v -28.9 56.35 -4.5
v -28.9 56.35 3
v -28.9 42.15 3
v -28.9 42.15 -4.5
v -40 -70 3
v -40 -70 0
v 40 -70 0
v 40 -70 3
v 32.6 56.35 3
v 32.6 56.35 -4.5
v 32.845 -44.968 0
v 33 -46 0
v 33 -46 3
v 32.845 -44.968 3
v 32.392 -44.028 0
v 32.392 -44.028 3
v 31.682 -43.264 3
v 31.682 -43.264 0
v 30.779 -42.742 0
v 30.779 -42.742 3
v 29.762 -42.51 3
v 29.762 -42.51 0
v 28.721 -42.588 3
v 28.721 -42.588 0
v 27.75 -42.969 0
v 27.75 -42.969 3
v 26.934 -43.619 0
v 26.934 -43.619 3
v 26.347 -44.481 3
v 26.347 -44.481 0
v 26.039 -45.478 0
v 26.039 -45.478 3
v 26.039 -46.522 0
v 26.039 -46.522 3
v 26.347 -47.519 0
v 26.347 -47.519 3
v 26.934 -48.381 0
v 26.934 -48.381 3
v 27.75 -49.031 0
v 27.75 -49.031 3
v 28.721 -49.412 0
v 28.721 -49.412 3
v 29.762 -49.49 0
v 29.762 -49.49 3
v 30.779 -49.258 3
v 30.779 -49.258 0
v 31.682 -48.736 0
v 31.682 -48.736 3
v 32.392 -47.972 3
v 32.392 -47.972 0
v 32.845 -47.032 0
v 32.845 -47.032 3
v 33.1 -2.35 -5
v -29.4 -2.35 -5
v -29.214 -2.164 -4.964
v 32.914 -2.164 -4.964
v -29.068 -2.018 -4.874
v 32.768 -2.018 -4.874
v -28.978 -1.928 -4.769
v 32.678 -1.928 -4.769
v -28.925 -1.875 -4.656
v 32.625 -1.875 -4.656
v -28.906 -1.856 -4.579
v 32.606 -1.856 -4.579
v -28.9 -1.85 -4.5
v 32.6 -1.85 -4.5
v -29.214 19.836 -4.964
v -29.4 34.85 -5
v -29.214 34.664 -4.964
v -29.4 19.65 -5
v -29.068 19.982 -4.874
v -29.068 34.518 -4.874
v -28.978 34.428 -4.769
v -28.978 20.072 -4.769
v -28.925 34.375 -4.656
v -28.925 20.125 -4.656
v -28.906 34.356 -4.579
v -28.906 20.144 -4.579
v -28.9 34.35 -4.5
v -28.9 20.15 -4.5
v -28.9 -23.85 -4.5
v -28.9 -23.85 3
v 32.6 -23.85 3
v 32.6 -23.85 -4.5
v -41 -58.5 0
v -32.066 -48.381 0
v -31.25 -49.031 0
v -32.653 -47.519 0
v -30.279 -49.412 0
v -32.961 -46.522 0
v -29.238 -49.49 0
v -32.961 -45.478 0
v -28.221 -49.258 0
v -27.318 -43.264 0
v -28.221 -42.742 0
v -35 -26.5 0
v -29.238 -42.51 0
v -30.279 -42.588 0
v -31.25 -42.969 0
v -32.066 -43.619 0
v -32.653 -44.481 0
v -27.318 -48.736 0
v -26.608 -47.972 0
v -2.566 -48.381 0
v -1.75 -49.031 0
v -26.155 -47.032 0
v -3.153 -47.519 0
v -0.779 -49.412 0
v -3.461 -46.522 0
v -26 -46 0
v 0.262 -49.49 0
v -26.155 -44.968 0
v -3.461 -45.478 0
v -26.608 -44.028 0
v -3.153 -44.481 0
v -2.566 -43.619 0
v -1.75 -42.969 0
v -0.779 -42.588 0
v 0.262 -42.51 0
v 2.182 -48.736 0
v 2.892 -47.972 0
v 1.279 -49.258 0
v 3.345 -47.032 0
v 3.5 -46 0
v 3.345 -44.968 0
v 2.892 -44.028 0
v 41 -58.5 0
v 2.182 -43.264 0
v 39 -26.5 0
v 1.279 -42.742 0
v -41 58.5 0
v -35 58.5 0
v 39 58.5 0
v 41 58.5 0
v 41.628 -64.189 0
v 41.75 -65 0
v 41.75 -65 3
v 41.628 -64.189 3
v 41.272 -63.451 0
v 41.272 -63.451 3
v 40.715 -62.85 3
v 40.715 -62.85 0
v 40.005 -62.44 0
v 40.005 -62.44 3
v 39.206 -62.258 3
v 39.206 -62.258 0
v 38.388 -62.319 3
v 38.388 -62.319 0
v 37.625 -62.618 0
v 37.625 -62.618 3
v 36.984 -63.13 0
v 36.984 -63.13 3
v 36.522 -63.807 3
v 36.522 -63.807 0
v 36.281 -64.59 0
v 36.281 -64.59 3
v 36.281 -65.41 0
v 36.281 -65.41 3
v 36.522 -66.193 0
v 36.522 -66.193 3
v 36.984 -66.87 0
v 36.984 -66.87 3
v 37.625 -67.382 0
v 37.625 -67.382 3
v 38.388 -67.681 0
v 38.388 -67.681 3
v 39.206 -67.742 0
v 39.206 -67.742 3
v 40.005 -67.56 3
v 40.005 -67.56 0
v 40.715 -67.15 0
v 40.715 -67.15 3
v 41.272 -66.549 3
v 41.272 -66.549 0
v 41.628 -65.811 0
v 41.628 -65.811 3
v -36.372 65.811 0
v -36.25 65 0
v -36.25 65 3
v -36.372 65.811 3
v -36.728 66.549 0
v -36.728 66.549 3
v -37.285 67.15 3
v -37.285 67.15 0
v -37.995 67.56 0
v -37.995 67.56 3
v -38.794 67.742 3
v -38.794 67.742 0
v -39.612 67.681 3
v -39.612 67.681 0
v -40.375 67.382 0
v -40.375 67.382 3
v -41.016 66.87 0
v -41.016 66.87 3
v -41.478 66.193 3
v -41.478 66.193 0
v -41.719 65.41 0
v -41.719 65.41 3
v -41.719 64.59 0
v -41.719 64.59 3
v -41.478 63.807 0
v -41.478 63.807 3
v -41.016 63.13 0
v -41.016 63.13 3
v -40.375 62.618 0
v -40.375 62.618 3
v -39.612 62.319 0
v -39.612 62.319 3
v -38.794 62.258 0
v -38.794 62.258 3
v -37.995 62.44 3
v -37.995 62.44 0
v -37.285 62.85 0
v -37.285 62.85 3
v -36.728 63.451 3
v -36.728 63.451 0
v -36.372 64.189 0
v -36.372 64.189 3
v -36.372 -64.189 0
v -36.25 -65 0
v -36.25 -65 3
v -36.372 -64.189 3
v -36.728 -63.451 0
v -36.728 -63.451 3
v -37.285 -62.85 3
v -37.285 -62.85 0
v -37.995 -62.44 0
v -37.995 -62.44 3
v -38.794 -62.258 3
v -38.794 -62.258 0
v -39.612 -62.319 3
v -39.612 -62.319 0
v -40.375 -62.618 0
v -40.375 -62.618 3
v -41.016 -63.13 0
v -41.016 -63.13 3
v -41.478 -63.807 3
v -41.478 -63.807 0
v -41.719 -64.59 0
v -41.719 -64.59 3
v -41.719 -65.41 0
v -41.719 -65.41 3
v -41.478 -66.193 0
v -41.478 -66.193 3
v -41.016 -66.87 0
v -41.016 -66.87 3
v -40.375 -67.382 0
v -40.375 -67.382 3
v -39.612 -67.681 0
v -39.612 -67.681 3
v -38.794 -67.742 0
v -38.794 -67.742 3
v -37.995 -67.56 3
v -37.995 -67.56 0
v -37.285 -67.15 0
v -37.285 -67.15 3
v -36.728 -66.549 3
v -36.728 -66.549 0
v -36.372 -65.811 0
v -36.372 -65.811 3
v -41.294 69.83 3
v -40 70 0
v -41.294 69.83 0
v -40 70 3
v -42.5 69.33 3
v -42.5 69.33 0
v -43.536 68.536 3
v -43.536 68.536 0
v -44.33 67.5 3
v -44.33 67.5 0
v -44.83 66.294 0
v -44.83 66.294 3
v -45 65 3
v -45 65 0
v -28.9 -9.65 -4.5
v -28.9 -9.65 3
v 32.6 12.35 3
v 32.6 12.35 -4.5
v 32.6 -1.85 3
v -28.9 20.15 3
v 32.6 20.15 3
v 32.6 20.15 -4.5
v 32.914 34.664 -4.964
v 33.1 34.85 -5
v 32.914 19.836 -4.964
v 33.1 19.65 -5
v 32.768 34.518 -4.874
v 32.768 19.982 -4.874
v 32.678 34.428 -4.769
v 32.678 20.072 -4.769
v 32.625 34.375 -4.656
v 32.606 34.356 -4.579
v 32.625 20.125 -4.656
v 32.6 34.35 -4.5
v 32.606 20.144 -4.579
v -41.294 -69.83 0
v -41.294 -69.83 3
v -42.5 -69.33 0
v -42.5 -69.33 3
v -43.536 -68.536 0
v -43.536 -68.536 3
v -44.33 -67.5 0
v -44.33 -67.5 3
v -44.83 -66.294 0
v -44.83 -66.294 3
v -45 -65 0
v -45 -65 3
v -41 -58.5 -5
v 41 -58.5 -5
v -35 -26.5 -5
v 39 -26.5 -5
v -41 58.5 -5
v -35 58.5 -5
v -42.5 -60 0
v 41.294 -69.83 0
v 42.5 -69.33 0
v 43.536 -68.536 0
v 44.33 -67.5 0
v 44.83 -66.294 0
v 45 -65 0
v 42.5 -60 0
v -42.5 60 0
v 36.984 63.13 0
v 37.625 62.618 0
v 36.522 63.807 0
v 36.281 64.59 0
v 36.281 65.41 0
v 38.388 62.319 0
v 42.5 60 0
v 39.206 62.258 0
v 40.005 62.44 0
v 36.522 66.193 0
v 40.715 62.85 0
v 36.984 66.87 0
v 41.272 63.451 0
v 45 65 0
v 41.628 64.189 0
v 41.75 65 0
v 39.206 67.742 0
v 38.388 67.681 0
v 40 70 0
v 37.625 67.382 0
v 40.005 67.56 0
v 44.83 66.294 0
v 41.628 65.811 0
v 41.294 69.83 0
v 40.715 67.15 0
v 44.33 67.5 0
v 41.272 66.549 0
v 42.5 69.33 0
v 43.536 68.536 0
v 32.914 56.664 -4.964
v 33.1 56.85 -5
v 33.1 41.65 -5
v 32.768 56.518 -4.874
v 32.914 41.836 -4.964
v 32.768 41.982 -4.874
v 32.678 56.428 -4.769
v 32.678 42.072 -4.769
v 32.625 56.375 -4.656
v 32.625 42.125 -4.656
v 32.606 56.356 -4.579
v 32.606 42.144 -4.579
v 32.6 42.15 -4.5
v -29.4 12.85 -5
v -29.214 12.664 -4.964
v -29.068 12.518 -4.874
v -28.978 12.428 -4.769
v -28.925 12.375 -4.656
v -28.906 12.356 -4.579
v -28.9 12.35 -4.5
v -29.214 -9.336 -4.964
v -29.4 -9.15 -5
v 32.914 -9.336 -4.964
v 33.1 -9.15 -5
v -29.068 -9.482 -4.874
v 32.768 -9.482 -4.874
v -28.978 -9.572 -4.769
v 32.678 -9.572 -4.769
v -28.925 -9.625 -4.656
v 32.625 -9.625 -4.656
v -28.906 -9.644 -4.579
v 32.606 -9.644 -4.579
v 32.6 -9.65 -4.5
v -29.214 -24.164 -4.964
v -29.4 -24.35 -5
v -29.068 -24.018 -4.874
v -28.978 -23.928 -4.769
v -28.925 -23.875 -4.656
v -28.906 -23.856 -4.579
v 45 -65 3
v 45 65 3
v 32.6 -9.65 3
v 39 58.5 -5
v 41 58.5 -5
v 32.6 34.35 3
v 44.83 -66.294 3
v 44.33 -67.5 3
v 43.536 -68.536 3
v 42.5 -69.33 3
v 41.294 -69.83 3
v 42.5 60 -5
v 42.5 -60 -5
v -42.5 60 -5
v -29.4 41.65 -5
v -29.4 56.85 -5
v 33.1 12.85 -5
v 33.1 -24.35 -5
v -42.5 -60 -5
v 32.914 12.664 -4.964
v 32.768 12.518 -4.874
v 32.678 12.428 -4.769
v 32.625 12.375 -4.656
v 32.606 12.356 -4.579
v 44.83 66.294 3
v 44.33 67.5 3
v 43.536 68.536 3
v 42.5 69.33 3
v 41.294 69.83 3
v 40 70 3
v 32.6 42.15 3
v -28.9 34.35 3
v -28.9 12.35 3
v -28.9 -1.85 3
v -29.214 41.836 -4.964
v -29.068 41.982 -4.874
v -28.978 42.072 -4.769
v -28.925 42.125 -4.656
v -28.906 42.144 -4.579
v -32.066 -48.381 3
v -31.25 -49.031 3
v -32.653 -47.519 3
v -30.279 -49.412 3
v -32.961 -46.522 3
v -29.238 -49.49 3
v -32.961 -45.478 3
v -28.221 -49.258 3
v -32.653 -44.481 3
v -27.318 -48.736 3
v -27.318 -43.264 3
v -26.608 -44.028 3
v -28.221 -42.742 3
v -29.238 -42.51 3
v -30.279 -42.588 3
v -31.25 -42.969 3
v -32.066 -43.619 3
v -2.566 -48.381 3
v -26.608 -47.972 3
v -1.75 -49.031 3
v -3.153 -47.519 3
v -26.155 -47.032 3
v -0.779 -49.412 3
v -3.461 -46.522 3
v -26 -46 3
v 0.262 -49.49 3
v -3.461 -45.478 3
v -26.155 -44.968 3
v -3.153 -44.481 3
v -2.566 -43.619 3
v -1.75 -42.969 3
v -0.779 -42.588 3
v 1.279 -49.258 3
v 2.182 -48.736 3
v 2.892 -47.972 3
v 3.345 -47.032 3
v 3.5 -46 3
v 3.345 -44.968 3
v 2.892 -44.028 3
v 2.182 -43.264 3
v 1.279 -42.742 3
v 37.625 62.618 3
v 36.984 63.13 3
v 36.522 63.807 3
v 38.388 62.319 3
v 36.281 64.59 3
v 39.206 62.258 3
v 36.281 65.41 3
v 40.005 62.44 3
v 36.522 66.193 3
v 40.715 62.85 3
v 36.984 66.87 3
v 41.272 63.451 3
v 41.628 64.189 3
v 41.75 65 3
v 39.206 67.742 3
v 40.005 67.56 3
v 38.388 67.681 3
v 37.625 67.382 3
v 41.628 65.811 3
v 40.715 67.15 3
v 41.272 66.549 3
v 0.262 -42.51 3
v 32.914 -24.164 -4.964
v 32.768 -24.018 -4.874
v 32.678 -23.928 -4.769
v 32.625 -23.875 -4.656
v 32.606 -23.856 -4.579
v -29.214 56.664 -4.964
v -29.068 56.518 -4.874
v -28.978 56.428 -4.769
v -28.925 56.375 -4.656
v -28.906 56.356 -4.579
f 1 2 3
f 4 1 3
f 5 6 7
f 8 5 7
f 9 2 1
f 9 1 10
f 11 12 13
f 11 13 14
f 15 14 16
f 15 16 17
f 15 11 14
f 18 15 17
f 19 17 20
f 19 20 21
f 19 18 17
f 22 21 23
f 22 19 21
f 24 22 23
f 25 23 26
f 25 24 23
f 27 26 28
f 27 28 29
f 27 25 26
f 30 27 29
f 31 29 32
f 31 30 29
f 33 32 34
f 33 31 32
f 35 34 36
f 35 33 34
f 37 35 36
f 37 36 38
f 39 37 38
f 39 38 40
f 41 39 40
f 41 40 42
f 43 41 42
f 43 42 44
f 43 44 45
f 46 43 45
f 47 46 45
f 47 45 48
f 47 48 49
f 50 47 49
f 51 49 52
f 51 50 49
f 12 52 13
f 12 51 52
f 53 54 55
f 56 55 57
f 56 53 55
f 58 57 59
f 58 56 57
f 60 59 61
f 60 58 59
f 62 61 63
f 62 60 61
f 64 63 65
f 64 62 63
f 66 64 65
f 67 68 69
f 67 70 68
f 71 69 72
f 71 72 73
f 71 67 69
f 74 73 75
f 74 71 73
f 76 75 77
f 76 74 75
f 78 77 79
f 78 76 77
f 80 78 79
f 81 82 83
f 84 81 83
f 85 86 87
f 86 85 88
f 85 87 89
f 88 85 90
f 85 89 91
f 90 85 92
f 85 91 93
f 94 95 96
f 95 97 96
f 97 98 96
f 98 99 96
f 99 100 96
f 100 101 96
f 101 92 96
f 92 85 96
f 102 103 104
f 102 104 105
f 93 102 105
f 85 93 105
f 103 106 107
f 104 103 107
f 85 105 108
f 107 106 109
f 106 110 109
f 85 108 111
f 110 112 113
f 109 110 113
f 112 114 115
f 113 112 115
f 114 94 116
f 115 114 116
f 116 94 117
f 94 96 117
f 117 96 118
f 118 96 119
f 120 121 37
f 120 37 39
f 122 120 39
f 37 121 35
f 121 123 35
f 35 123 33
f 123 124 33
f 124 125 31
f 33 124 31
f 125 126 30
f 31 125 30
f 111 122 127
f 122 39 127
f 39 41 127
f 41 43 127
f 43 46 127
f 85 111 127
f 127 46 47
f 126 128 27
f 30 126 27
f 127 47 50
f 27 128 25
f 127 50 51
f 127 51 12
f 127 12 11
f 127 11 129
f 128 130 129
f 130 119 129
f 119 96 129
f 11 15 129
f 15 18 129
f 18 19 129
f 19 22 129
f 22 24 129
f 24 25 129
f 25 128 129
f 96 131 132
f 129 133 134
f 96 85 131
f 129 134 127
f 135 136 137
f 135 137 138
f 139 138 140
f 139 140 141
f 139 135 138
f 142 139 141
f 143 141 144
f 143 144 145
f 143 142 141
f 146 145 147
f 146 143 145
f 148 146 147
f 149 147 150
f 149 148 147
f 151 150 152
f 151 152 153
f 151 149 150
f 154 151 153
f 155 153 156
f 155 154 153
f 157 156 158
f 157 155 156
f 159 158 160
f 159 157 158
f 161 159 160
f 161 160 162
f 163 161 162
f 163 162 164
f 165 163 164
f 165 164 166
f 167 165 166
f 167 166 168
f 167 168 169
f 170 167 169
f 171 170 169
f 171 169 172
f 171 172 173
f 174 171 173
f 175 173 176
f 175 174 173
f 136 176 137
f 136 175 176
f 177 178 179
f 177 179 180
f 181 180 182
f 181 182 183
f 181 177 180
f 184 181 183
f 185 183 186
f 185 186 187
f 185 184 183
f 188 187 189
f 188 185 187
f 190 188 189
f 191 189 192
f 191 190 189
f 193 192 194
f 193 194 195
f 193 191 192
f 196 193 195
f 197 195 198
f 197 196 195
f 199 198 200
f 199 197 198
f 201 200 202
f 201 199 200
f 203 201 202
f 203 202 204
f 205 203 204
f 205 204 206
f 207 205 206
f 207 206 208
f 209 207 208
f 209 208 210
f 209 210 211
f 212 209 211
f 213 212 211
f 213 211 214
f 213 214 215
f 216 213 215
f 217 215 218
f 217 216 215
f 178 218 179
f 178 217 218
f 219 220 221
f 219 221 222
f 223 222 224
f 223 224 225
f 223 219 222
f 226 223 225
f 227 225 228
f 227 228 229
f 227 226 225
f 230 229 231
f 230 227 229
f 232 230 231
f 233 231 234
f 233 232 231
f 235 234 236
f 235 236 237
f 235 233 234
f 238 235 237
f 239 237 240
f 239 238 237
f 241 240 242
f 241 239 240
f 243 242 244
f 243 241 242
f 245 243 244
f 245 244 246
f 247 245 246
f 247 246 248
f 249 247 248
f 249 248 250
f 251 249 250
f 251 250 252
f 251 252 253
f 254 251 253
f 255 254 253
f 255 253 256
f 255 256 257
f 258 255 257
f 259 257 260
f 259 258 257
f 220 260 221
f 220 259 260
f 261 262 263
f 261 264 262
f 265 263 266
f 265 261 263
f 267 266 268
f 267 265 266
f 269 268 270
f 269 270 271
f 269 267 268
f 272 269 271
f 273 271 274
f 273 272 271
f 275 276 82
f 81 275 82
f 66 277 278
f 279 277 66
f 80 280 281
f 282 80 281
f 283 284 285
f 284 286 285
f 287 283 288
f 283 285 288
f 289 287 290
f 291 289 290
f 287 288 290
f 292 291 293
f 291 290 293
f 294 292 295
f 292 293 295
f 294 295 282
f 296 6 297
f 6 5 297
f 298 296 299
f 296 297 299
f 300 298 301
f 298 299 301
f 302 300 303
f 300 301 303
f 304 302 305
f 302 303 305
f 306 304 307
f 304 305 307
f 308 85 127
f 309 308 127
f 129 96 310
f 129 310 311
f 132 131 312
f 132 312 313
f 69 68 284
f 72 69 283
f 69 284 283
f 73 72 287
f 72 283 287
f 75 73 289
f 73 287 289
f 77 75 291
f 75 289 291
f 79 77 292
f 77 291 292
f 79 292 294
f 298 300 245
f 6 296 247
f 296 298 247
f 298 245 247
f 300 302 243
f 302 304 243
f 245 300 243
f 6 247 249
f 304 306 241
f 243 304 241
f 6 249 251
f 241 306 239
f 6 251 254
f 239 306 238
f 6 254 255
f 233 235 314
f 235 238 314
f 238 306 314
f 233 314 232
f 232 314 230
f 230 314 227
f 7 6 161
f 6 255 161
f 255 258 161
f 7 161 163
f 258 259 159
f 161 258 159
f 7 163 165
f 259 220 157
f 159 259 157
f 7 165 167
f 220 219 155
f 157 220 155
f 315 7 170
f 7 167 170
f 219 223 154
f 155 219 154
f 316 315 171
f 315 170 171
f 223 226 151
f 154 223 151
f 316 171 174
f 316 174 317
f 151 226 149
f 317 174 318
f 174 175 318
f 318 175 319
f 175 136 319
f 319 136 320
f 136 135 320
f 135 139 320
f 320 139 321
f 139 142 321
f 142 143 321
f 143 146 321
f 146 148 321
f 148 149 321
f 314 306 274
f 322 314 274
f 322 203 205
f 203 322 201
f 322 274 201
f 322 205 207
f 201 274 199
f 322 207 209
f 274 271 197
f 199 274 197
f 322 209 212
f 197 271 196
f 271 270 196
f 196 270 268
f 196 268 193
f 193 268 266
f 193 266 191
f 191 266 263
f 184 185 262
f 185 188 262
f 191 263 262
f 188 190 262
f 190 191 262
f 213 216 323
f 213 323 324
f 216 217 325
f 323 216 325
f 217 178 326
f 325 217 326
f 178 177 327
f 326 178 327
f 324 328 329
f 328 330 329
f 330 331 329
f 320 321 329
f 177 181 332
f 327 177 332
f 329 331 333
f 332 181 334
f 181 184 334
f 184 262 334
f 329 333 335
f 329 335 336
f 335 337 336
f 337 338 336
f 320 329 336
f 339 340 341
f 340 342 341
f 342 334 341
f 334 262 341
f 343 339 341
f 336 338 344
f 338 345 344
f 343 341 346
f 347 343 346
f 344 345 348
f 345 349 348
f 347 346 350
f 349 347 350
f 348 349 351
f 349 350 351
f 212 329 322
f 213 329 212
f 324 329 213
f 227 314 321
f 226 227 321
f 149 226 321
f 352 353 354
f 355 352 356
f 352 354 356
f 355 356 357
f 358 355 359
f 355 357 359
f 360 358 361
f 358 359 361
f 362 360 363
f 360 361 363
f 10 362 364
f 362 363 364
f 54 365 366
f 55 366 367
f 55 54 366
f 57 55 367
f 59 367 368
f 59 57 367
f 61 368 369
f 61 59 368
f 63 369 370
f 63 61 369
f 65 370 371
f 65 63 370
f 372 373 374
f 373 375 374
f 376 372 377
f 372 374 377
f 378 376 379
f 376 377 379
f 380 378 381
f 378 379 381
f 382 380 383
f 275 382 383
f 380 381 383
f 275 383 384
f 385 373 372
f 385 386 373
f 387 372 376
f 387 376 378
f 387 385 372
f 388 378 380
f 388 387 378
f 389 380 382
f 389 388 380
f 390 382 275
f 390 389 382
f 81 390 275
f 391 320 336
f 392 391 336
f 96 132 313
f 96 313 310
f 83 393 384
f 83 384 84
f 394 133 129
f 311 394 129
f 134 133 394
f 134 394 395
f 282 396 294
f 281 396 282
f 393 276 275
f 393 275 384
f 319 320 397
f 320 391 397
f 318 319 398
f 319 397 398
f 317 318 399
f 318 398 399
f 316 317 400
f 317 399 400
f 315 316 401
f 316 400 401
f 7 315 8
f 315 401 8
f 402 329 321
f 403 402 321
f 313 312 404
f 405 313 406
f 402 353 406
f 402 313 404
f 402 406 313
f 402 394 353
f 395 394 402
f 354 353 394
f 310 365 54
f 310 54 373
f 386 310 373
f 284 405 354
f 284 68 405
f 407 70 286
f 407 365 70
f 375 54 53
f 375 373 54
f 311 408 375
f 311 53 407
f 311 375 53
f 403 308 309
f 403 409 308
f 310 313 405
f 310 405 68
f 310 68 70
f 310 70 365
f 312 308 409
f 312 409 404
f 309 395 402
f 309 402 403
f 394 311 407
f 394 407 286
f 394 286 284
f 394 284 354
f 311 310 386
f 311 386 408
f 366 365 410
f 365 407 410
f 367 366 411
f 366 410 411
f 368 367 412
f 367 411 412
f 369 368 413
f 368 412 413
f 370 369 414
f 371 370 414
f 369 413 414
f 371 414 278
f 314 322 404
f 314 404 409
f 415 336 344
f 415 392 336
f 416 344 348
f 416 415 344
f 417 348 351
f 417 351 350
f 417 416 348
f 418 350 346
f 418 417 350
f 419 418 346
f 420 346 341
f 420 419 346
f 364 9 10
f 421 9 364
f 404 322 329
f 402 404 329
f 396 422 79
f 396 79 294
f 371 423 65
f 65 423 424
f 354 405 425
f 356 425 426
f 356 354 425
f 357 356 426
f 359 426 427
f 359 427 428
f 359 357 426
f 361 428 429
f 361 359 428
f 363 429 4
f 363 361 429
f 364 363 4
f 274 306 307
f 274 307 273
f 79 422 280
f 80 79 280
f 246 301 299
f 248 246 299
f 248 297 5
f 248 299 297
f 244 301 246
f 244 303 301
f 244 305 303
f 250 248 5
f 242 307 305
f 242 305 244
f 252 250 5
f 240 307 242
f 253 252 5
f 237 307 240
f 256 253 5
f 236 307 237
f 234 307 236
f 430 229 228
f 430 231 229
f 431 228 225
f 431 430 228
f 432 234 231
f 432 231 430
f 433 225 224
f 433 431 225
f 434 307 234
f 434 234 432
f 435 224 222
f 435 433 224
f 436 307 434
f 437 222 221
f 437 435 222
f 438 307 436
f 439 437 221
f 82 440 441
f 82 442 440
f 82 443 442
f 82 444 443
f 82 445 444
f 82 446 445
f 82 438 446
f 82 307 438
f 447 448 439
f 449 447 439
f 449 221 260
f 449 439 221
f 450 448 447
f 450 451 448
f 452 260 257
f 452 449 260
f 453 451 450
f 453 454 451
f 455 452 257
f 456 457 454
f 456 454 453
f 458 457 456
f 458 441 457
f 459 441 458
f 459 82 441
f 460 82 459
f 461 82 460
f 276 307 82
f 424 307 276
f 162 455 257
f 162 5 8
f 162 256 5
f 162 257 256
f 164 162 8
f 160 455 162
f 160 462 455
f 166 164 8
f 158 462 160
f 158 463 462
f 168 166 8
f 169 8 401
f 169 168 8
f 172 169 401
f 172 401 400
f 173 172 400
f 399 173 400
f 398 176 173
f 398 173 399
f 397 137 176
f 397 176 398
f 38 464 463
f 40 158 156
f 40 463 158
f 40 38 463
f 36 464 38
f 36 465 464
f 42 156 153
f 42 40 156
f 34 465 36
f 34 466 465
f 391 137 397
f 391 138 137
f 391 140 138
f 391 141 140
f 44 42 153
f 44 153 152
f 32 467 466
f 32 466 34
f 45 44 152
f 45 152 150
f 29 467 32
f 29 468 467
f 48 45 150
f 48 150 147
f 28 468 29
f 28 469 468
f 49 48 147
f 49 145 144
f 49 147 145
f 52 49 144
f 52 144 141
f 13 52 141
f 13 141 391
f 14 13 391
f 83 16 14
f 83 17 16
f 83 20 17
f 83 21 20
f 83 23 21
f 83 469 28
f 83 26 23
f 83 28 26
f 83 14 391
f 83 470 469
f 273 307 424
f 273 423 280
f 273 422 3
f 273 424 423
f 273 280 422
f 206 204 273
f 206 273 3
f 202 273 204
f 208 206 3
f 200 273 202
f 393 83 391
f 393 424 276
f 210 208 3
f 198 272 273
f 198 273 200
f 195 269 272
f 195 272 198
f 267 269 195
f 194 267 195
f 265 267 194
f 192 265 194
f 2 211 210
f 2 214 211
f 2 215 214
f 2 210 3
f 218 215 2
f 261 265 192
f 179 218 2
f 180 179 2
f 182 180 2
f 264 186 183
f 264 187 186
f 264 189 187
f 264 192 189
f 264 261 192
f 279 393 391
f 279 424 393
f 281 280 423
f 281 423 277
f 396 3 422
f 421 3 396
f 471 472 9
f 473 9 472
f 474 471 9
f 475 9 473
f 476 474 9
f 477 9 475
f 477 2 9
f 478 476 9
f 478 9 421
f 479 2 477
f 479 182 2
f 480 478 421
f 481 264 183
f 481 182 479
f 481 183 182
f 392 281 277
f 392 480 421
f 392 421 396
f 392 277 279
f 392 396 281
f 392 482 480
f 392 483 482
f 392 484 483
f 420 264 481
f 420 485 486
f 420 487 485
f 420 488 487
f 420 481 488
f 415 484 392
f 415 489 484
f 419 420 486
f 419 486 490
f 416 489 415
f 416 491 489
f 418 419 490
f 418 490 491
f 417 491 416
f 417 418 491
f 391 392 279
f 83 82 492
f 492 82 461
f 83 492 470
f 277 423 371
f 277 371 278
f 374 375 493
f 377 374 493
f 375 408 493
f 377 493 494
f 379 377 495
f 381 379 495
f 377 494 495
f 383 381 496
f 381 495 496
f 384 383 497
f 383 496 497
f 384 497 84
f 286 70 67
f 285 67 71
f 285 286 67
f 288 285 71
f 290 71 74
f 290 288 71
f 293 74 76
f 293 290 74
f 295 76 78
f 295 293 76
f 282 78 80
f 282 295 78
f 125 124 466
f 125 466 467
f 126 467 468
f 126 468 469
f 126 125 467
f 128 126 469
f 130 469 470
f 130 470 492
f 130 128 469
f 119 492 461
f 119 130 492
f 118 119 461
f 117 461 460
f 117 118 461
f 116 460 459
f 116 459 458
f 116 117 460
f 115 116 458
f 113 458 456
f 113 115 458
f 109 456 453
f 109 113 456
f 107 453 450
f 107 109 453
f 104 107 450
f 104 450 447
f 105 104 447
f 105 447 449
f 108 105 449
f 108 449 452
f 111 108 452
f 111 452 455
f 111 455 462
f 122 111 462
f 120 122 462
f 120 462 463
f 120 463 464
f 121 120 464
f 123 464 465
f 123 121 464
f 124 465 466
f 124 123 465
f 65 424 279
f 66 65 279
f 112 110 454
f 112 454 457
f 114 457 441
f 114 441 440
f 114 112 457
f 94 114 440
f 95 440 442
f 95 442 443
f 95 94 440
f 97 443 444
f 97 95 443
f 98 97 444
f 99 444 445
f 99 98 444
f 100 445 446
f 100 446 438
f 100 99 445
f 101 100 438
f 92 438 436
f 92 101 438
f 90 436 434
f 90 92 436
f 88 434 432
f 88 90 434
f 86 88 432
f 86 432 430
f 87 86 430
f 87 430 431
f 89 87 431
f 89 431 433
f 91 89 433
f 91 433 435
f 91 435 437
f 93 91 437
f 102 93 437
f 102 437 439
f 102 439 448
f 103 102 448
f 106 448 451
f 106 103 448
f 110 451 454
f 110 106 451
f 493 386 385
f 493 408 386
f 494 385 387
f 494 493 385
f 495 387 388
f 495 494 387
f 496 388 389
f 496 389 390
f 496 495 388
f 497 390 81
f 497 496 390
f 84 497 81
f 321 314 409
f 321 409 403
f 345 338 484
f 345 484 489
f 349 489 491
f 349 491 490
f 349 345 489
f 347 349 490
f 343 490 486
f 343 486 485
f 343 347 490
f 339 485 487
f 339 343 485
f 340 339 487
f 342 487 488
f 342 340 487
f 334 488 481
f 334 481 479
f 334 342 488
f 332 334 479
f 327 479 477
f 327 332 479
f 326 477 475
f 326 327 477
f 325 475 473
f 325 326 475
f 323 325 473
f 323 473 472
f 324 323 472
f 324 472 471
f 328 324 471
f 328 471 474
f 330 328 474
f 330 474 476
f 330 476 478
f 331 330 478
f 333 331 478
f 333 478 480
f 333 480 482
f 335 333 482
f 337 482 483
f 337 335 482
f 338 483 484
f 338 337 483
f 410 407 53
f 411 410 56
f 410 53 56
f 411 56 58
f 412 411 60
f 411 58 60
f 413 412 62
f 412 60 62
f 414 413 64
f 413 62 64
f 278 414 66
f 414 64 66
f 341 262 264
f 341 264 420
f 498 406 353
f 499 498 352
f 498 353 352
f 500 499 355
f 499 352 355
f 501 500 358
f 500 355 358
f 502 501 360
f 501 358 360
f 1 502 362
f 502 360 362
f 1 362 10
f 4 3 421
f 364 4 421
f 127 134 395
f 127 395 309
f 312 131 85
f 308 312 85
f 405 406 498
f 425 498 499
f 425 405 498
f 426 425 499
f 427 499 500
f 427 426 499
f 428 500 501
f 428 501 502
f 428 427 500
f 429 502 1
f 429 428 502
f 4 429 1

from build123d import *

# Parameters (mm, degrees)
SKETCH034_W   = 90
SKETCH034_H   = 140
SKETCH034_R   = 2.75
SKETCH034_R_2 = 3.5
SKETCH034_W_2 = 61.5
SKETCH034_H_2 = 14.2
PAD016_DEPTH  = 3
SKETCH033_W   = 85
SKETCH033_H   = 120
SKETCH033_W_2 = 82
SKETCH033_H_2 = 117
PAD017_DEPTH  = 5
SKETCH035_W   = 74
SKETCH035_H   = 85
SKETCH035_W_2 = 61.5
SKETCH035_H_2 = 14.2
PAD018_DEPTH  = 5
FILLET013_R   = 5
FILLET015_R   = 0.5


with BuildPart() as part:
    # Sketch034 → Pad016 (new body)
    with BuildSketch(Plane.XY):
        Rectangle(SKETCH034_W, SKETCH034_H)
        with Locations((-39, 65)):
            Circle(SKETCH034_R, mode=Mode.SUBTRACT)
        with Locations((39, 65)):
            Circle(SKETCH034_R, mode=Mode.SUBTRACT)
        with Locations((39, -65)):
            Circle(SKETCH034_R, mode=Mode.SUBTRACT)
        with Locations((-39, -65)):
            Circle(SKETCH034_R, mode=Mode.SUBTRACT)
        with Locations((-29.5, -46)):
            Circle(SKETCH034_R_2, mode=Mode.SUBTRACT)
        with Locations((0, -46)):
            Circle(SKETCH034_R_2, mode=Mode.SUBTRACT)
        with Locations((29.5, -46)):
            Circle(SKETCH034_R_2, mode=Mode.SUBTRACT)
        with Locations((1.85, 49.25)):
            Rectangle(SKETCH034_W_2, SKETCH034_H_2, mode=Mode.SUBTRACT)
        with Locations((1.85, 27.25)):
            Rectangle(SKETCH034_W_2, SKETCH034_H_2, mode=Mode.SUBTRACT)
        with Locations((1.85, 5.25)):
            Rectangle(SKETCH034_W_2, SKETCH034_H_2, mode=Mode.SUBTRACT)
        with Locations((1.85, -16.75)):
            Rectangle(SKETCH034_W_2, SKETCH034_H_2, mode=Mode.SUBTRACT)
    extrude(amount=PAD016_DEPTH)

    # Sketch033 (on Face28 of Pad016) → Pad017 (join)
    with BuildSketch(Plane(origin=(0, 0, 0), x_dir=(1, 0, 0), z_dir=(0, 0, -1))):
        Rectangle(SKETCH033_W, SKETCH033_H)
        Rectangle(SKETCH033_W_2, SKETCH033_H_2, mode=Mode.SUBTRACT)
    extrude(amount=PAD017_DEPTH)

    # Sketch035 (on Face35 of Pad017) → Pad018 (join)
    with BuildSketch(Plane(origin=(0, 0, 0), x_dir=(1, 0, 0), z_dir=(0, 0, -1))):
        with Locations((2, -16)):
            Rectangle(SKETCH035_W, SKETCH035_H)
        with Locations((1.85, -49.25)):
            Rectangle(SKETCH035_W_2, SKETCH035_H_2, mode=Mode.SUBTRACT)
        with Locations((1.85, 16.75)):
            Rectangle(SKETCH035_W_2, SKETCH035_H_2, mode=Mode.SUBTRACT)
        with Locations((1.85, -27.25)):
            Rectangle(SKETCH035_W_2, SKETCH035_H_2, mode=Mode.SUBTRACT)
        with Locations((1.85, -5.25)):
            Rectangle(SKETCH035_W_2, SKETCH035_H_2, mode=Mode.SUBTRACT)
    extrude(amount=PAD018_DEPTH)

    # Fillet013
    fillet013_edges = [part.edges().sort_by_distance(p)[0] for p in [
        (45, -70, 1.5),
        (-45, -70, 1.5),
        (-45, 70, 1.5),
        (45, 70, 1.5),
    ]]
    fillet(fillet013_edges, radius=FILLET013_R)

    # Fillet015
    fillet015_edges = [part.edges().sort_by_distance(p)[0] for p in [
        (1.85, 56.35, -5),
        (32.6, 49.25, -5),
        (-28.9, 49.25, -5),
        (1.85, 42.15, -5),
        (1.85, -9.65, -5),
        (32.6, -16.75, -5),
        (1.85, -23.85, -5),
        (-28.9, -16.75, -5),
        (1.85, 12.35, -5),
        (32.6, 5.25, -5),
        (1.85, -1.85, -5),
        (-28.9, 5.25, -5),
        (1.85, 34.35, -5),
        (-28.9, 27.25, -5),
        (1.85, 20.15, -5),
        (32.6, 27.25, -5),
    ]]
    fillet(fillet015_edges, radius=FILLET015_R)


solid = part.part
